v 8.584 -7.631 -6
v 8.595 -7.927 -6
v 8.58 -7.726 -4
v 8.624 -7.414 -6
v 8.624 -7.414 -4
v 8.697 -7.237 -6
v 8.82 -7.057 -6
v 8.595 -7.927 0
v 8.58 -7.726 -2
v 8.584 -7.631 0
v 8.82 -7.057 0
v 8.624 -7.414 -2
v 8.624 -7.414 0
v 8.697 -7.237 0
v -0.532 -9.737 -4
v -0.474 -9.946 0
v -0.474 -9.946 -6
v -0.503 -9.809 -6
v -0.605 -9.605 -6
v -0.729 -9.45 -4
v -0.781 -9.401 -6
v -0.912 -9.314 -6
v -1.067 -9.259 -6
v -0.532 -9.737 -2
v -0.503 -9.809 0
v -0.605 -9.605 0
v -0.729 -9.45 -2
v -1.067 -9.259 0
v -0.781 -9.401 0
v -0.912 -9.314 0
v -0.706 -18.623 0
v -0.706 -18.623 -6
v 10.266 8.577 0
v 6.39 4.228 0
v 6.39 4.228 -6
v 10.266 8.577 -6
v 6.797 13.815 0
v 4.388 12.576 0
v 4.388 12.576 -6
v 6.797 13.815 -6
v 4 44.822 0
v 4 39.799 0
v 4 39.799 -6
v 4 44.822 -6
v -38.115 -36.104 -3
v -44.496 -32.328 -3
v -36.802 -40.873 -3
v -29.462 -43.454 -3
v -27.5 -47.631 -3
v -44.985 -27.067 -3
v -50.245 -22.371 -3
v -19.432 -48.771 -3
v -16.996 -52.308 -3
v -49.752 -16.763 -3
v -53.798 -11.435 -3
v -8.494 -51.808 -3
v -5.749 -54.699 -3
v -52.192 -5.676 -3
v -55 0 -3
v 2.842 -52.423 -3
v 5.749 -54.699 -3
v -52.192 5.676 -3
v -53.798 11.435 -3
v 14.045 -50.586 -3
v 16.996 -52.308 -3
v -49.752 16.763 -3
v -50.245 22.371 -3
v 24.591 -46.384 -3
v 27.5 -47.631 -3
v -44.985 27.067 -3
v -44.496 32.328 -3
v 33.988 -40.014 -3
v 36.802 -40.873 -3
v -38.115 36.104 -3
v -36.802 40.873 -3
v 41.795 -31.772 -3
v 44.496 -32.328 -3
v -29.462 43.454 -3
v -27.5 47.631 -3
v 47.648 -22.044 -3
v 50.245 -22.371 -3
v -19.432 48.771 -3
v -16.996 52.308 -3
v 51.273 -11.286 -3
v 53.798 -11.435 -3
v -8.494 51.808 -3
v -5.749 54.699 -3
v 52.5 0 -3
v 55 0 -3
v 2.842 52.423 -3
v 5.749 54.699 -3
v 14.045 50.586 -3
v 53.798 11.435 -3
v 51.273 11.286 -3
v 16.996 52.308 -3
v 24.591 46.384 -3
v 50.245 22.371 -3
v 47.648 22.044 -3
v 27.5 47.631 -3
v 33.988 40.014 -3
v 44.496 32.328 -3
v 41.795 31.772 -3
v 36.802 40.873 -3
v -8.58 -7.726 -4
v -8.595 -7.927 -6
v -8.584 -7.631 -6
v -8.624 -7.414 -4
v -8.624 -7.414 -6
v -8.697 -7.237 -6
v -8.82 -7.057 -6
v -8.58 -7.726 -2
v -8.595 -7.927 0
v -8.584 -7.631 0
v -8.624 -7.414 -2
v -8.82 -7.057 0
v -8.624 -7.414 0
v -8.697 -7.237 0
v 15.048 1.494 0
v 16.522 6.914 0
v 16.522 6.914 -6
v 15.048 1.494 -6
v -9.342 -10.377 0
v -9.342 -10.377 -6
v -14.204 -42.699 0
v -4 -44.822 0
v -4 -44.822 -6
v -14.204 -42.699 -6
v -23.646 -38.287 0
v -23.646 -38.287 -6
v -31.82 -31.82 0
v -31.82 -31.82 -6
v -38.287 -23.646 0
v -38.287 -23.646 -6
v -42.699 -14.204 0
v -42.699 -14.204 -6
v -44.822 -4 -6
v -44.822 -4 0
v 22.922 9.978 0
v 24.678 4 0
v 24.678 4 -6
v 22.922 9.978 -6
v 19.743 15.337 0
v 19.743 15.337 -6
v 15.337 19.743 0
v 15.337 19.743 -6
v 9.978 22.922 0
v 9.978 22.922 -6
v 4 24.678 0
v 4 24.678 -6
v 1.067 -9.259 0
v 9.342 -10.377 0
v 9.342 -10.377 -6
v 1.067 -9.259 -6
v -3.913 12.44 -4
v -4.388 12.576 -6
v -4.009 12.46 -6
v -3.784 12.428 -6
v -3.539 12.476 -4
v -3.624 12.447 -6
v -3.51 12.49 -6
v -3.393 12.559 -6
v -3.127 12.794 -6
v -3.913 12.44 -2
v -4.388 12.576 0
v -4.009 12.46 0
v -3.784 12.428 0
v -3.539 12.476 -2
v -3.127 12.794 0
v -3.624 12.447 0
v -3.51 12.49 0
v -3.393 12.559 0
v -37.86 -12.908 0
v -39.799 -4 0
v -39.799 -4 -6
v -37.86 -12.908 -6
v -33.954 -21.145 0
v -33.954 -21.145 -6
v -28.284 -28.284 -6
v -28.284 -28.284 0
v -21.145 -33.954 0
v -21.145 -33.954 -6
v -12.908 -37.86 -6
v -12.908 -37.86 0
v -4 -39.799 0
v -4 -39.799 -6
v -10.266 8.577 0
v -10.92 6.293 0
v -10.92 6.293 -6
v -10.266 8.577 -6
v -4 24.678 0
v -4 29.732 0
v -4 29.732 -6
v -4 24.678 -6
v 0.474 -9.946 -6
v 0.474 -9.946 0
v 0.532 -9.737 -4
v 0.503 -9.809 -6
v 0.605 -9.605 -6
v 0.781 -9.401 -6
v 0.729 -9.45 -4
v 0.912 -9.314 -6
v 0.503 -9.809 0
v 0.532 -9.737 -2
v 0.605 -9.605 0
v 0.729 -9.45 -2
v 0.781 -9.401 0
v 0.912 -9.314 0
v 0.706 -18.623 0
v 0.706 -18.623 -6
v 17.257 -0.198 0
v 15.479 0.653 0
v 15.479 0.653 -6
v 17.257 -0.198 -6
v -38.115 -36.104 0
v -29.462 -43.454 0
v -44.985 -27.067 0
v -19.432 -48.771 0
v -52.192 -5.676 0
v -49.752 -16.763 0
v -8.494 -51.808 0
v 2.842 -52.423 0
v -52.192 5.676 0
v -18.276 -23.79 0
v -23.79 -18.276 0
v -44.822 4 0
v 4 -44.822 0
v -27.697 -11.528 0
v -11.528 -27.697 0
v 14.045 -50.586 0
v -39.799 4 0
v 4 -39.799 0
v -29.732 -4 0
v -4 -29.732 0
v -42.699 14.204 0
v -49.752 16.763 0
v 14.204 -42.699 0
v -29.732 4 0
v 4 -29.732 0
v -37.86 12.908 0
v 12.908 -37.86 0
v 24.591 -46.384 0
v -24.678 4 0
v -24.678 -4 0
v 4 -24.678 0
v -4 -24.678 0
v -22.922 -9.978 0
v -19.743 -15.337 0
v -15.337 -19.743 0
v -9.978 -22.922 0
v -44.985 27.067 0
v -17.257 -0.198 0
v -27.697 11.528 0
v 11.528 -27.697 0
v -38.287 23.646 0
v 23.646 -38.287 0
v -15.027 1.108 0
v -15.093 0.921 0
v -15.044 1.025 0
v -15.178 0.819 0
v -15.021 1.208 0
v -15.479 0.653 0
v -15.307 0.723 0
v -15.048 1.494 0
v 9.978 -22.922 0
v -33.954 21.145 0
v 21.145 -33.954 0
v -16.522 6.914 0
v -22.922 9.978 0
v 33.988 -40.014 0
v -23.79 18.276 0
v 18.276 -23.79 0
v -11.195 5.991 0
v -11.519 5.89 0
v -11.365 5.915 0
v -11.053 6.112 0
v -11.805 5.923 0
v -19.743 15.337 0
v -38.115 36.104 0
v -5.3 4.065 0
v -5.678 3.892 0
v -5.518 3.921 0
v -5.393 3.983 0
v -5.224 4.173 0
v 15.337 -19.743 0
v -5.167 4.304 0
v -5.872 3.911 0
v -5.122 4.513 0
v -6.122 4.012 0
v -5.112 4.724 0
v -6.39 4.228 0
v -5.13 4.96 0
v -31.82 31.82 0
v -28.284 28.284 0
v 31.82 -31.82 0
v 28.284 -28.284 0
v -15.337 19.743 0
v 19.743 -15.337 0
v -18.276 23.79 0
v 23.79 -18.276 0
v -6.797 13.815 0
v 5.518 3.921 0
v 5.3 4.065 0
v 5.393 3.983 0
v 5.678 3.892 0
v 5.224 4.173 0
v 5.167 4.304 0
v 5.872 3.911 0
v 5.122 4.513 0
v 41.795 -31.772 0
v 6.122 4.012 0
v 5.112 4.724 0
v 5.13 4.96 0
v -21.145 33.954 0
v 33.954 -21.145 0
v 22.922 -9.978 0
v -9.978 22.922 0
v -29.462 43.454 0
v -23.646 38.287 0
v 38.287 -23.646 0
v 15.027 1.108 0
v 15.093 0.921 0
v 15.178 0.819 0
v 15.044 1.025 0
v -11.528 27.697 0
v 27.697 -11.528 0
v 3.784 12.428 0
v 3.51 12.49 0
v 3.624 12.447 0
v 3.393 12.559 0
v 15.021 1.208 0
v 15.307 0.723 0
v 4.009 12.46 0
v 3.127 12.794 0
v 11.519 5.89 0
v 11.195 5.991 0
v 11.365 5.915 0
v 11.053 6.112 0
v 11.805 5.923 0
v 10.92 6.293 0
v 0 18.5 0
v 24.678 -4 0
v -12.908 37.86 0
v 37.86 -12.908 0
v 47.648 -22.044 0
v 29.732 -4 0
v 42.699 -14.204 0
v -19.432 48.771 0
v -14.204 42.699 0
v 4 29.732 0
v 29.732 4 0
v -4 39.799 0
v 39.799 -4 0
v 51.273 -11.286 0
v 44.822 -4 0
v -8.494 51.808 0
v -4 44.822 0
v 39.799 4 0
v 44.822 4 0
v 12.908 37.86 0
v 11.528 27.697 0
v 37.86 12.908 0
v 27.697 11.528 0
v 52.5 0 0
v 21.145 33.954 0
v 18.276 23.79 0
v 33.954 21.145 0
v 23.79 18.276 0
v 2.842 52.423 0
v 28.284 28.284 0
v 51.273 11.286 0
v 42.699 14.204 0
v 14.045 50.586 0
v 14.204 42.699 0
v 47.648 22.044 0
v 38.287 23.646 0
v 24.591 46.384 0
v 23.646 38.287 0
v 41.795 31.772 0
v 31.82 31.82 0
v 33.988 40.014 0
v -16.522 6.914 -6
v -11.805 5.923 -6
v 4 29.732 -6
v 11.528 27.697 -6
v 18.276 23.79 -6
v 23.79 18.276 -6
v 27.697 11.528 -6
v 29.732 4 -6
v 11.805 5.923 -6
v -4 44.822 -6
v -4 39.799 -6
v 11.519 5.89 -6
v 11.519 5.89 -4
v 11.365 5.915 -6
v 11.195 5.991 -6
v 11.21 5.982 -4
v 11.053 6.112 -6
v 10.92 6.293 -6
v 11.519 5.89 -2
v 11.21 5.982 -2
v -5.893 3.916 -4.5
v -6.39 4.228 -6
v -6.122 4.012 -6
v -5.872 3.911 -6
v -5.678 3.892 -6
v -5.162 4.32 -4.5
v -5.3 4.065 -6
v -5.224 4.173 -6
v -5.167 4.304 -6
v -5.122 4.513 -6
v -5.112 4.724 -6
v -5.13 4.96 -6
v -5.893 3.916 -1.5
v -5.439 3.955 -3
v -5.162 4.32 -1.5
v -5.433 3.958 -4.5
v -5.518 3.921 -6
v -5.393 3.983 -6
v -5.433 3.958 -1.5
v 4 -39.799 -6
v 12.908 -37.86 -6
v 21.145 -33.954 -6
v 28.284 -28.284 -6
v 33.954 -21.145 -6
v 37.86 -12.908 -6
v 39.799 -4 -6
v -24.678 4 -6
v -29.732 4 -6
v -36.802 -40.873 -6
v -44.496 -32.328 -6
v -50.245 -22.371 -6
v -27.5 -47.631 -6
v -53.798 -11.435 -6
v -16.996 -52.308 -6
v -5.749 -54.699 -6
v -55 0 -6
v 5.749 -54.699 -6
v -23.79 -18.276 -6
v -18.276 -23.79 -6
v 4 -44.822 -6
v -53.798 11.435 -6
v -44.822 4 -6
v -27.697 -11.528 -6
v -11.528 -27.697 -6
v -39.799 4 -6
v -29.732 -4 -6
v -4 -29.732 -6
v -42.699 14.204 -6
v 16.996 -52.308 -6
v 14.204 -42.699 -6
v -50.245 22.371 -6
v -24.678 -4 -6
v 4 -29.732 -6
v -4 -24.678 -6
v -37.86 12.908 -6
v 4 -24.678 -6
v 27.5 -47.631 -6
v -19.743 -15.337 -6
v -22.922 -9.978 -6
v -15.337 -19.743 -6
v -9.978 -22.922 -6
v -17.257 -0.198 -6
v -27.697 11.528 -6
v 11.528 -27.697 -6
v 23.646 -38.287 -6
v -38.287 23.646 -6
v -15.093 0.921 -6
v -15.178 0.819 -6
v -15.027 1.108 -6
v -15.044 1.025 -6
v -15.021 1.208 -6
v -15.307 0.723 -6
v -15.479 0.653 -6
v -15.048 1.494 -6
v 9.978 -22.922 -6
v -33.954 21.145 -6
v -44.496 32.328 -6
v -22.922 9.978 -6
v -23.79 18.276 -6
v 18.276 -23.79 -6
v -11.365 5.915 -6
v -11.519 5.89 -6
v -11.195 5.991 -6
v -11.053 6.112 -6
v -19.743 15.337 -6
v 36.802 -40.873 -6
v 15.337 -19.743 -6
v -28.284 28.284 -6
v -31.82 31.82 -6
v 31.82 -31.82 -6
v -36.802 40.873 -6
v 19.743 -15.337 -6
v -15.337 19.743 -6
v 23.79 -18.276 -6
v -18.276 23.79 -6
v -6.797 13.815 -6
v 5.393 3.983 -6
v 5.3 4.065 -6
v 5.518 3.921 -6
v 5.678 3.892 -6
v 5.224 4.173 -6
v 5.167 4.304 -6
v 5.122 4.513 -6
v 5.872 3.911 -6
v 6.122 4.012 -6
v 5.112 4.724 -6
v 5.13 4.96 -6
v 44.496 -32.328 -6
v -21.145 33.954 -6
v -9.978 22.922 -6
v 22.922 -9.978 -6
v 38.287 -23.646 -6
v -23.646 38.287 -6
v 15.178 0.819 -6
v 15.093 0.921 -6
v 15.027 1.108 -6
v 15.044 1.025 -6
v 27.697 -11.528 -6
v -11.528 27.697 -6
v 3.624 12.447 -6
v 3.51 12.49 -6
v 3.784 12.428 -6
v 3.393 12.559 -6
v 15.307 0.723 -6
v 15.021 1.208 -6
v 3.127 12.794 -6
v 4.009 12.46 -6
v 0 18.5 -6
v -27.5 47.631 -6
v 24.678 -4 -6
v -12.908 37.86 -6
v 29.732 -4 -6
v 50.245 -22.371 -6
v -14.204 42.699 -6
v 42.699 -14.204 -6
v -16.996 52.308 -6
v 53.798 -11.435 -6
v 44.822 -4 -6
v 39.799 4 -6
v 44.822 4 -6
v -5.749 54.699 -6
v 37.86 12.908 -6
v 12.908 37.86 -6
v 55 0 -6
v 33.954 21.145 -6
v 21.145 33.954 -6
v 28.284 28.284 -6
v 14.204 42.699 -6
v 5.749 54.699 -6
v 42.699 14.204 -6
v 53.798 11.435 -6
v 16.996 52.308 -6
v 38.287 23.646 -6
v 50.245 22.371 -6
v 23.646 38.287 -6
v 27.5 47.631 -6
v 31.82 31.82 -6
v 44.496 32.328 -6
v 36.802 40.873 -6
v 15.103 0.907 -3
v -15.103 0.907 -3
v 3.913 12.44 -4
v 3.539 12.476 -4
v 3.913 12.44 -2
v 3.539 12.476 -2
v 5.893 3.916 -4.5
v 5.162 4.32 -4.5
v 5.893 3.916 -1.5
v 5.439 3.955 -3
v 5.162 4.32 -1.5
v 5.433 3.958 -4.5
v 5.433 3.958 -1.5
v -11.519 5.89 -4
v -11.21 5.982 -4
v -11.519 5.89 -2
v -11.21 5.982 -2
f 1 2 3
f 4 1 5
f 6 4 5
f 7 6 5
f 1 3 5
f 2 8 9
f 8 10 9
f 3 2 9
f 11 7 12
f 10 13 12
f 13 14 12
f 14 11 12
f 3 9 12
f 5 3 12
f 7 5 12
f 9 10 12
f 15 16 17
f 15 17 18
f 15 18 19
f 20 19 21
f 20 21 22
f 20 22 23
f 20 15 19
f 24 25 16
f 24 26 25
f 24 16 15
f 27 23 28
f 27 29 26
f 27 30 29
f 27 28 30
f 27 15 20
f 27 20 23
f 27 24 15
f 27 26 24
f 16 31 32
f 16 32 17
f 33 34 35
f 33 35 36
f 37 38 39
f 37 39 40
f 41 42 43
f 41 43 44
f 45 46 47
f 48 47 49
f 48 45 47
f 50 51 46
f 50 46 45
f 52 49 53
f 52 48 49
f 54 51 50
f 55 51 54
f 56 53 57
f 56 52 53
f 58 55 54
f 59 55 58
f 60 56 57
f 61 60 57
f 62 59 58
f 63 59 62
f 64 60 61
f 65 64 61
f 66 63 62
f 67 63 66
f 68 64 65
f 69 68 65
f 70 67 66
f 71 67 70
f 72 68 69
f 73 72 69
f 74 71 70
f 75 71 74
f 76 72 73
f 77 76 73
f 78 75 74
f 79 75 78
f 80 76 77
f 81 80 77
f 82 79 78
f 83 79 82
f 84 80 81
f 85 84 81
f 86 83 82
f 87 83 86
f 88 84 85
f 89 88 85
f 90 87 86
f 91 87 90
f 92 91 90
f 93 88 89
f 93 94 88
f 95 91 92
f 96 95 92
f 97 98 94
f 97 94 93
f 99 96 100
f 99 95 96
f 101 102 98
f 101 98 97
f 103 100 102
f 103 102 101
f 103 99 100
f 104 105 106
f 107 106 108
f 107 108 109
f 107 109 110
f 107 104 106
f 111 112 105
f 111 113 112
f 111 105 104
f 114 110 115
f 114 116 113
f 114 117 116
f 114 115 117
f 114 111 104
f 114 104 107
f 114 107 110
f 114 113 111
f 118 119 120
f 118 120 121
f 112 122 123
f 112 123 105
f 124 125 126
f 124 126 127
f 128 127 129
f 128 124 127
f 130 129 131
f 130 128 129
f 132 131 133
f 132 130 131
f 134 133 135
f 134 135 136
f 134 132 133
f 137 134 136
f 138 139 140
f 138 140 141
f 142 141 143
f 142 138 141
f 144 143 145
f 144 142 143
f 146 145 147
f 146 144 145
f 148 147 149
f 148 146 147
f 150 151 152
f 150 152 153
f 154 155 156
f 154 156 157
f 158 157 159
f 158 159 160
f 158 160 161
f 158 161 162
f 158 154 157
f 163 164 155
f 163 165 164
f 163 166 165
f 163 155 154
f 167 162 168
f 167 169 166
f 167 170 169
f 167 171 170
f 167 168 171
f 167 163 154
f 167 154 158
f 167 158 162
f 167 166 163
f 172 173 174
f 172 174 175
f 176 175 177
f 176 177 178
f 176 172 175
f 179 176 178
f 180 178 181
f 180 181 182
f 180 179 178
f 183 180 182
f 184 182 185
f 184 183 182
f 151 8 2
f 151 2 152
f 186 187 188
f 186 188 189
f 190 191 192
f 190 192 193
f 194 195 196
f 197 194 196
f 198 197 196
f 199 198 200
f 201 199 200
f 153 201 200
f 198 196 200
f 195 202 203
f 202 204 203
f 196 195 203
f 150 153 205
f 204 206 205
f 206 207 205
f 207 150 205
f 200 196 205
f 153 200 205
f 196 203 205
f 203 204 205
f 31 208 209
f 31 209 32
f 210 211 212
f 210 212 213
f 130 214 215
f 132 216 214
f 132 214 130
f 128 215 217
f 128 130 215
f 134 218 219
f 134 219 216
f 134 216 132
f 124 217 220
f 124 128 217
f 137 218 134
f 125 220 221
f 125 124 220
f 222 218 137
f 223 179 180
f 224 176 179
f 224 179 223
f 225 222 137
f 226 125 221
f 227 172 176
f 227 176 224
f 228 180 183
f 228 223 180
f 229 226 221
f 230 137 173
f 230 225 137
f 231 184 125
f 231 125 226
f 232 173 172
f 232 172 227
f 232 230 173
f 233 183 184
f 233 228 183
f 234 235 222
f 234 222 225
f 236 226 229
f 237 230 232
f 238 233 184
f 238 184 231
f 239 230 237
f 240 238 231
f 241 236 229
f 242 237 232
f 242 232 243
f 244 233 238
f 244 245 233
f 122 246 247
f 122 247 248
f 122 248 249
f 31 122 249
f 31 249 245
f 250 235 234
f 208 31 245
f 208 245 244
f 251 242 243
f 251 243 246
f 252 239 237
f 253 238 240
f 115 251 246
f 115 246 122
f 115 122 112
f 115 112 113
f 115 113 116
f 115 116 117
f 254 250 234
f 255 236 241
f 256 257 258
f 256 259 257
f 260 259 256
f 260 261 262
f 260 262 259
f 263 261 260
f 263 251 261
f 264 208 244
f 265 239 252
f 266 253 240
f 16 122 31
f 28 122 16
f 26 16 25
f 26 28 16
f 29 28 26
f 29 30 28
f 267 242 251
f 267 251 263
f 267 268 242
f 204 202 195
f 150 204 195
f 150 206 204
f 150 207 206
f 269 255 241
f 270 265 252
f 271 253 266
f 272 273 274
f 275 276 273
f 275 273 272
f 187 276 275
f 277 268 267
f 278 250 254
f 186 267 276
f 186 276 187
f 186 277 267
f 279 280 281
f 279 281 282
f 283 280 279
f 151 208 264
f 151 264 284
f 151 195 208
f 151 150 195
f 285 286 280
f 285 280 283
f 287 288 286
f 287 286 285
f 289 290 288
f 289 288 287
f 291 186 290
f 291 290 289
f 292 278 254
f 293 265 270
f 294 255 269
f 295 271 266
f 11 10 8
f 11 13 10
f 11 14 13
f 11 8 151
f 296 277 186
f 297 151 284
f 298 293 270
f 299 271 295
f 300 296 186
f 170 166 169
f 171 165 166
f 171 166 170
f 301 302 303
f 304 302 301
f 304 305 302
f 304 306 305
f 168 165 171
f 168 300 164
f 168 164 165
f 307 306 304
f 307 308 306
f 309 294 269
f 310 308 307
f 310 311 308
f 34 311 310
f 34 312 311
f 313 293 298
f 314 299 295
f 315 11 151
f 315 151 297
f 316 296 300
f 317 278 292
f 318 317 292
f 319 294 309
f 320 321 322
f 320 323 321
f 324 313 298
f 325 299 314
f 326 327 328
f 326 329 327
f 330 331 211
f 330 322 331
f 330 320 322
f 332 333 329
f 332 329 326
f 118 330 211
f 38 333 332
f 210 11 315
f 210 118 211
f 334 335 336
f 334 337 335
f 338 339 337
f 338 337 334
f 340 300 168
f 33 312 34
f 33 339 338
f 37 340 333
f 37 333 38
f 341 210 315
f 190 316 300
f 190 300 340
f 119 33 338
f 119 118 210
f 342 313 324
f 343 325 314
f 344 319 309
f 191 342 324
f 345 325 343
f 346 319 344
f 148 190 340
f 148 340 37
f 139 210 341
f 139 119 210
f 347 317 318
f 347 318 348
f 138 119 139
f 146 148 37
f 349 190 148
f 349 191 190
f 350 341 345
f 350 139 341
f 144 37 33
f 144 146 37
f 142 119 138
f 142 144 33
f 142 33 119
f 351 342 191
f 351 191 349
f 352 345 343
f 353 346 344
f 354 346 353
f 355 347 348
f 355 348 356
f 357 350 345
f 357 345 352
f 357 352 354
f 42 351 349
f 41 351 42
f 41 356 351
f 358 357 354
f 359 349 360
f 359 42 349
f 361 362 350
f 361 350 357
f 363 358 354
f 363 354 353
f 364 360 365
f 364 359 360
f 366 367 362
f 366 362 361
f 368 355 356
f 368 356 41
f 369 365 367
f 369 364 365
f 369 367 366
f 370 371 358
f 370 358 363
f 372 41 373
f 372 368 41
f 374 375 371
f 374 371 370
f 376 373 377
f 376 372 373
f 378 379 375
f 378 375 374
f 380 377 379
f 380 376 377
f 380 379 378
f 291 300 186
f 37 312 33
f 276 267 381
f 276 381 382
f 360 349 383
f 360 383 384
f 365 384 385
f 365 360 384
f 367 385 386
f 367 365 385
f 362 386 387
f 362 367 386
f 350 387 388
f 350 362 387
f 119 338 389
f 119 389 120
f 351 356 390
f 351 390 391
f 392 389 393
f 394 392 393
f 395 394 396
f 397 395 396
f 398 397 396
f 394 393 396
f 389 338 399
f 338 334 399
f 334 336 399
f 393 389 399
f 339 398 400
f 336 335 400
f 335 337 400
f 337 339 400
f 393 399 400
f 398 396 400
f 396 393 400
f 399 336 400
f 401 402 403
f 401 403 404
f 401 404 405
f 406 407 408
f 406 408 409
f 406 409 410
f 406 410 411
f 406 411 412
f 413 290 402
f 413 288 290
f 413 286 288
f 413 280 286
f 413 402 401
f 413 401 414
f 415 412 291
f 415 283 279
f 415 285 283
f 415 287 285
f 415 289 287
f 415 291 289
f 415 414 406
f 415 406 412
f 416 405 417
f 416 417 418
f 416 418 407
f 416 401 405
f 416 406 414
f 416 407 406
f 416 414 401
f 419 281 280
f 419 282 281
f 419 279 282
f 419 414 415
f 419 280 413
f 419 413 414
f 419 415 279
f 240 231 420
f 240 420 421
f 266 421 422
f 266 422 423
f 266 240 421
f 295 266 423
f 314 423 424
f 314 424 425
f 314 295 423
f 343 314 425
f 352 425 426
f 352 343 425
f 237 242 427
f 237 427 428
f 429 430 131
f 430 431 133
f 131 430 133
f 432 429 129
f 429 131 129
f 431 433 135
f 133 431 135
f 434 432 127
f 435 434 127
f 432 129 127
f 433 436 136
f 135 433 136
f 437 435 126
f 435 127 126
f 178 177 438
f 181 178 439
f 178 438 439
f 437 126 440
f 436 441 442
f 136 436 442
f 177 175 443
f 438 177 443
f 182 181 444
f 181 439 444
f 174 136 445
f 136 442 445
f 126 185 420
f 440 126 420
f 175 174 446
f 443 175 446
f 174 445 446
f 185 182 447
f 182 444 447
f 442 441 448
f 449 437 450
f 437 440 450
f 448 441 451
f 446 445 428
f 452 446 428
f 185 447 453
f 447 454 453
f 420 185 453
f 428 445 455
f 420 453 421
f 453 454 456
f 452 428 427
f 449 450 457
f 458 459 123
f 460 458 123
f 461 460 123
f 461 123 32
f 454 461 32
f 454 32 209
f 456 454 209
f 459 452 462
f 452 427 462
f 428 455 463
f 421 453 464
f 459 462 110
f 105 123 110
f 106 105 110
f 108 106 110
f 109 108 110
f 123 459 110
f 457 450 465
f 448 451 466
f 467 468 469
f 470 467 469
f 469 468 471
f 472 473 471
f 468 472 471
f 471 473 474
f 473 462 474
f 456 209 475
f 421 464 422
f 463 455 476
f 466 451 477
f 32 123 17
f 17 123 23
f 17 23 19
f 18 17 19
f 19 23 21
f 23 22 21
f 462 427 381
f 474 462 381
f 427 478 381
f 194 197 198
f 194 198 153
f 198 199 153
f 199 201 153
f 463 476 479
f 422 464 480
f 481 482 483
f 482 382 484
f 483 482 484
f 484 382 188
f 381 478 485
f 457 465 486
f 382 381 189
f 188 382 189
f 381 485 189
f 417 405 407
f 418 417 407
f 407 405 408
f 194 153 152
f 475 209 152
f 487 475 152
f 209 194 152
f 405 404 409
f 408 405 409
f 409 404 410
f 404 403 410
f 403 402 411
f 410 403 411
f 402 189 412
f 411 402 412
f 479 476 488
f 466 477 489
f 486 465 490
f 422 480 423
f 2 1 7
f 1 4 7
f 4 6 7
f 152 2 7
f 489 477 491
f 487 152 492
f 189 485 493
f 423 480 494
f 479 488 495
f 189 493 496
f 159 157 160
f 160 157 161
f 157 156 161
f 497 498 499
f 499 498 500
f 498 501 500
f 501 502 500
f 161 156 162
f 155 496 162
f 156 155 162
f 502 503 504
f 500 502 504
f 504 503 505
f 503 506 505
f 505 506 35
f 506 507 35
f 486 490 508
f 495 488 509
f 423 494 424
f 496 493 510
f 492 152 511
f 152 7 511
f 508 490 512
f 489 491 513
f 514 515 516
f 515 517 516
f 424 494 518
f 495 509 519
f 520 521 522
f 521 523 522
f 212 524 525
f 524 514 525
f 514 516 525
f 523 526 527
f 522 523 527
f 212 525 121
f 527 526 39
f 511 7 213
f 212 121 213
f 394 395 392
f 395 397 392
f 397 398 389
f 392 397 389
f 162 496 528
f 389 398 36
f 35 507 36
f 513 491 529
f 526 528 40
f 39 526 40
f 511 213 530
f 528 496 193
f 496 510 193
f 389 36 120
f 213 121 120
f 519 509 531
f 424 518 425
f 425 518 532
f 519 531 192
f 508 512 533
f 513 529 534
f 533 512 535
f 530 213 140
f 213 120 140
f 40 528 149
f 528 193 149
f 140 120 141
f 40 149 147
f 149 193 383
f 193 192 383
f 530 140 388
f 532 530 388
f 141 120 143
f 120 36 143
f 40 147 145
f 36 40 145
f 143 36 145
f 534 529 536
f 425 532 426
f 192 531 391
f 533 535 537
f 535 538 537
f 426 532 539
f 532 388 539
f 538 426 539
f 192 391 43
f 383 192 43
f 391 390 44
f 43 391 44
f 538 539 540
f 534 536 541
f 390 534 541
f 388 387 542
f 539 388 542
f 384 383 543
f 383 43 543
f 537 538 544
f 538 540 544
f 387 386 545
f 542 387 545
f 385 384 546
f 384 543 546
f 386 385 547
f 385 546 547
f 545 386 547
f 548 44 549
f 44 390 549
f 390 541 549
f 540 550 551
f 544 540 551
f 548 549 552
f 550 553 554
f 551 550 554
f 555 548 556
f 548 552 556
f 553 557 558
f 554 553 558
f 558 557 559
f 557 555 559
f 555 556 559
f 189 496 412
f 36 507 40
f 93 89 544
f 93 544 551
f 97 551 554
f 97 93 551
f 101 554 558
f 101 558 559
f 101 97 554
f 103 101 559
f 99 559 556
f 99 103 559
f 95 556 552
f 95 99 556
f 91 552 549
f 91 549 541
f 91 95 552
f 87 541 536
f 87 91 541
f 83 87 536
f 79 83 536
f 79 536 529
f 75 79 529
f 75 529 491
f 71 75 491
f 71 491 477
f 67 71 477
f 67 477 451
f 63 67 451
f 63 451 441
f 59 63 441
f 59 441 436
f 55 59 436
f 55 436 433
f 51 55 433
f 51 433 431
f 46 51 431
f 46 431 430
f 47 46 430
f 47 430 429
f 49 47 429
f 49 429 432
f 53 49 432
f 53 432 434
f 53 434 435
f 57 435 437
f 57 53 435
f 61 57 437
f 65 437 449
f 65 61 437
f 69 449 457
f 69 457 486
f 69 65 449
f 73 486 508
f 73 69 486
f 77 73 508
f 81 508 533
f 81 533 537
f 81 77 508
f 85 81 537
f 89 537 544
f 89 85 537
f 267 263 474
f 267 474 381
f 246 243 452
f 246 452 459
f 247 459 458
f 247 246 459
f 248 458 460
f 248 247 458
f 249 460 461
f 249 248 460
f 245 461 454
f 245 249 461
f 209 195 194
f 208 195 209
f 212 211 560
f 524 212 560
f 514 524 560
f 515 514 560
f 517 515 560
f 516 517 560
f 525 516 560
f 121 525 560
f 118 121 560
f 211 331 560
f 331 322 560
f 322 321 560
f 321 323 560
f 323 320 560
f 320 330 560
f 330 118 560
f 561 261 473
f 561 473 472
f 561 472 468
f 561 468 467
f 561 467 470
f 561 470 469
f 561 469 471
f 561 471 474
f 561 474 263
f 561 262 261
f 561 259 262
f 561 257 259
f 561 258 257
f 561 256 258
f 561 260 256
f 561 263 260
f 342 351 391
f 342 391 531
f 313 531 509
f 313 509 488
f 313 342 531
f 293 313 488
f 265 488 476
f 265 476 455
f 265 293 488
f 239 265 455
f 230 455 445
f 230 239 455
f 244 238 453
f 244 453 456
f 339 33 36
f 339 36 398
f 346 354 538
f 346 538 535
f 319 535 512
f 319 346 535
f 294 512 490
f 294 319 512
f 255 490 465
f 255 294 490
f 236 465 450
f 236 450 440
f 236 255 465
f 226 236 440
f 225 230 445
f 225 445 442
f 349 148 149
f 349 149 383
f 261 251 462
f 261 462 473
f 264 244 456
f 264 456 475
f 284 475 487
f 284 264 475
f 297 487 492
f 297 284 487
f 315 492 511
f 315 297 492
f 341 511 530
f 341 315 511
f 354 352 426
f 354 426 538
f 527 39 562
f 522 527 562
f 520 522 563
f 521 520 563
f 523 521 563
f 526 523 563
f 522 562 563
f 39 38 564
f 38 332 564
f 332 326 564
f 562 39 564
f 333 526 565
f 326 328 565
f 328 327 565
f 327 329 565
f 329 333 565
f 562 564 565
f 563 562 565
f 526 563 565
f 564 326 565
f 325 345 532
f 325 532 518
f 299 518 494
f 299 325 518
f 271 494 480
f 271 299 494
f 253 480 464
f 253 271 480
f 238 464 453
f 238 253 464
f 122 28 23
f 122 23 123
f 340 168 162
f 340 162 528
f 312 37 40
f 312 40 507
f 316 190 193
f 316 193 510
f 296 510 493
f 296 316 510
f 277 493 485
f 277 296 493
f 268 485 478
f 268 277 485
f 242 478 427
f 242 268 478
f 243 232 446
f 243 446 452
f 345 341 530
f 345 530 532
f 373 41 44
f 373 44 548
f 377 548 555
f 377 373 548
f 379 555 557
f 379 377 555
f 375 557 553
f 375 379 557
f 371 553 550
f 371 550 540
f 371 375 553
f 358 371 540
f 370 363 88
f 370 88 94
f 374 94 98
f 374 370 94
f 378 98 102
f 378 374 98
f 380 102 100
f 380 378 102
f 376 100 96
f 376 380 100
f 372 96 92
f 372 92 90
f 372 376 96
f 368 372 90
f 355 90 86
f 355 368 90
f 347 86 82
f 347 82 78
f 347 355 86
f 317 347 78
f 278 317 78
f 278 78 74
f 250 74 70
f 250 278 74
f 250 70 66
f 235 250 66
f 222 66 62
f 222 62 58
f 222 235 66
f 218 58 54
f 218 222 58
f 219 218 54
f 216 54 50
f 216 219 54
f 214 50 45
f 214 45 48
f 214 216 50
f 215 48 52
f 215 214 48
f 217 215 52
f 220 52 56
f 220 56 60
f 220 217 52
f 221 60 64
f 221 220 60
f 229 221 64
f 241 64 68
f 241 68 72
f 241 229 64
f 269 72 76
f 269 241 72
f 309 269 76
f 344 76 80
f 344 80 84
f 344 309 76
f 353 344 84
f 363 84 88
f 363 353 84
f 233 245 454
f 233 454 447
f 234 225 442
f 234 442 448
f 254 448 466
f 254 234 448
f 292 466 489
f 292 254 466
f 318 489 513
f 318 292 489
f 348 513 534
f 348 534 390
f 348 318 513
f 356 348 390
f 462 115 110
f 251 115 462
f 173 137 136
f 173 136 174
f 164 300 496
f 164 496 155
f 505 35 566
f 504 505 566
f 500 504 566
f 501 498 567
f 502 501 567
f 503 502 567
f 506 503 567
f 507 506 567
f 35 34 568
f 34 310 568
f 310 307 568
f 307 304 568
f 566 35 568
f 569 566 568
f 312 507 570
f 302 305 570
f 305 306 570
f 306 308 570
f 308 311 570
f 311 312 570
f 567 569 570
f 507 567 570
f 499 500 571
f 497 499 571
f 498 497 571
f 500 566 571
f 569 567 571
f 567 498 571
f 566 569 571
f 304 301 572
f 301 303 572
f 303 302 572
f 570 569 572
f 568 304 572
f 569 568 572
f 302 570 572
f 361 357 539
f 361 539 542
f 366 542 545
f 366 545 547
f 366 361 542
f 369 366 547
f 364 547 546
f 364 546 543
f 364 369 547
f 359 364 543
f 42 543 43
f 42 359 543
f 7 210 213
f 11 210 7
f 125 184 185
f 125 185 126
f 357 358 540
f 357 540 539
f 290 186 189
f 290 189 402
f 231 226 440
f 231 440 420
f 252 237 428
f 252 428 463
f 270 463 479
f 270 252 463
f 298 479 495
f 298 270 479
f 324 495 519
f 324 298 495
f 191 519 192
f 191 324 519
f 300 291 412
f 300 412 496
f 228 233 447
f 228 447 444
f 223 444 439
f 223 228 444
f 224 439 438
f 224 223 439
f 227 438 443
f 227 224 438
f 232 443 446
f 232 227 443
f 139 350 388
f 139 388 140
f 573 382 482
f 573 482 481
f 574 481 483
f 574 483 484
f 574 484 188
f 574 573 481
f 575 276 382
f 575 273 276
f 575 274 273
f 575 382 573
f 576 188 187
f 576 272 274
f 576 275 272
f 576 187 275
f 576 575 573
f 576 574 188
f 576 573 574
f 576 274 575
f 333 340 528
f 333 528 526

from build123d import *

# Parameters (mm, degrees)
F0_R     = 55
F0_R_2   = 52.5
F1_DEPTH = 6
F2_DEPTH = 3


with BuildPart() as f1:
    # F0 (on Top) → F1 (new body)
    with BuildSketch(Plane.XY):
        Circle(F0_R)
        Circle(F0_R_2, mode=Mode.SUBTRACT)
        Circle(F0_R_2)
        with BuildLine():
            Line((-4, -39.7994974843), (-4, -44.821869662))
            ThreePointArc((-4, -44.821869662), (-31.8198051534, -31.8198051534), (-44.821869662, -4))
            Line((-44.821869662, -4), (-39.7994974843, -4))
            ThreePointArc((-39.7994974843, -4), (-28.2842712475, -28.2842712475), (-4, -39.7994974843))
        make_face(mode=Mode.SUBTRACT)
        with BuildLine():
            ThreePointArc((-4, -29.7321374946), (-21.2132034356, -21.2132034356), (-29.7321374946, -4))
            Line((-29.7321374946, -4), (-24.6779253585, -4))
            ThreePointArc((-24.6779253585, -4), (-17.6776695297, -17.6776695297), (-4, -24.6779253585))
            Line((-4, -24.6779253585), (-4, -29.7321374946))
        make_face(mode=Mode.SUBTRACT)
        with BuildLine():
            Line((39.7994974843, -4), (44.821869662, -4))
            ThreePointArc((44.821869662, -4), (31.8198051534, -31.8198051534), (4, -44.821869662))
            Line((4, -44.821869662), (4, -39.7994974843))
            ThreePointArc((4, -39.7994974843), (28.2842712475, -28.2842712475), (39.7994974843, -4))
        make_face(mode=Mode.SUBTRACT)
        with BuildLine():
            ThreePointArc((29.7321374946, -4), (21.2132034356, -21.2132034356), (4, -29.7321374946))
            Line((4, -29.7321374946), (4, -24.6779253585))
            ThreePointArc((4, -24.6779253585), (17.6776695297, -17.6776695297), (24.6779253585, -4))
            Line((24.6779253585, -4), (29.7321374946, -4))
        make_face(mode=Mode.SUBTRACT)
        with BuildLine():
            Line((0.7063379744, -18.6231244003), (0, -18.6231244003))
            Line((0, -18.6231244003), (-0.7063379744, -18.6231244003))
            Line((-0.7063379744, -18.6231244003), (-0.4744689504, -9.9455872551))
            add(Edge.make_bspline(
                [(-0.4744689504, -9.9455872551), (-0.4627407761, -9.8347328603), (-0.6571381819, -9.3434378505), (-1.0671400232, -9.2586101964)],
                knots=[0, 0, 0, 0, 0.9073017578, 0.9073017578, 0.9073017578, 0.9073017578], degree=3))
            Line((-1.0671400232, -9.2586101964), (-9.3420948833, -10.3767029941))
            Line((-9.3420948833, -10.3767029941), (-8.5947467014, -7.927252911))
            add(Edge.make_bspline(
                [(-8.5947467014, -7.927252911), (-8.5831601173, -7.8032519668), (-8.5160043091, -7.4144573882), (-8.8199712336, -7.0574730635)],
                knots=[0, 0, 0, 0, 0.8984670685, 0.8984670685, 0.8984670685, 0.8984670685], degree=3))
            Line((-8.8199712336, -7.0574730635), (-17.2568876296, -0.1983663387))
            Line((-17.2568876296, -0.1983663387), (-15.4789015651, 0.6534472341))
            add(Edge.make_bspline(
                [(-15.4789015651, 0.6534472341), (-15.2981067076, 0.7015652373), (-15.0379305841, 0.9150229577), (-14.9981947616, 1.1539326515), (-15.0481807068, 1.4938330278)],
                knots=[0, 0, 0, 0, 0.4670435173, 1, 1, 1, 1], degree=3))
            Line((-15.0481807068, 1.4938330278), (-16.5220610797, 6.9137872197))
            Line((-16.5220610797, 6.9137872197), (-11.80508174, 5.9227617458))
            add(Edge.make_bspline(
                [(-11.80508174, 5.9227617458), (-11.5451579913, 5.8577810414), (-11.1852632836, 5.842785351), (-10.9203411266, 6.2926532701)],
                knots=[0, 0, 0, 0, 0.9589503078, 0.9589503078, 0.9589503078, 0.9589503078], degree=3))
            Line((-10.9203411266, 6.2926532701), (-10.265532881, 8.576983586))
            Line((-10.265532881, 8.576983586), (-6.390159484, 4.2284368537))
            add(Edge.make_bspline(
                [(-6.390159484, 4.2284368537), (-6.0810563155, 3.8955565542), (-5.2899533571, 3.7433779044), (-5.0645819865, 4.4543202966), (-5.1299692132, 4.9595851451)],
                knots=[0, 0, 0, 0, 0.4924700015, 1, 1, 1, 1], degree=3))
            Line((-5.1299692132, 4.9595851451), (-6.7966869101, 13.8145368546))
            Line((-6.7966869101, 13.8145368546), (-4.387574736, 12.5758592039))
            add(Edge.make_bspline(
                [(-4.387574736, 12.5758592039), (-3.8159328979, 12.3909162357), (-3.60577018, 12.298444286), (-3.1265998259, 12.794428505)],
                knots=[0, 0, 0, 0, 1.2797774272, 1.2797774272, 1.2797774272, 1.2797774272], degree=3))
            Line((-3.1265998259, 12.794428505), (0, 18.499981612))
            Line((0, 18.499981612), (3.1265998259, 12.794428505))
            add(Edge.make_bspline(
                [(4.387574736, 12.5758592039), (3.8159328979, 12.3909162357), (3.60577018, 12.298444286), (3.1265998259, 12.794428505)],
                knots=[0, 0, 0, 0, 1.2797774272, 1.2797774272, 1.2797774272, 1.2797774272], degree=3))
            Line((4.387574736, 12.5758592039), (6.7966869101, 13.8145368546))
            Line((6.7966869101, 13.8145368546), (5.1299692132, 4.9595851451))
            add(Edge.make_bspline(
                [(6.390159484, 4.2284368537), (6.0810563155, 3.8955565542), (5.2899533571, 3.7433779044), (5.0645819865, 4.4543202966), (5.1299692132, 4.9595851451)],
                knots=[0, 0, 0, 0, 0.4924700015, 1, 1, 1, 1], degree=3))
            Line((6.390159484, 4.2284368537), (10.265532881, 8.576983586))
            Line((10.265532881, 8.576983586), (10.9203411266, 6.2926532701))
            add(Edge.make_bspline(
                [(11.80508174, 5.9227617458), (11.5451579913, 5.8577810414), (11.1852632836, 5.842785351), (10.9203411266, 6.2926532701)],
                knots=[0, 0, 0, 0, 0.9589503078, 0.9589503078, 0.9589503078, 0.9589503078], degree=3))
            Line((11.80508174, 5.9227617458), (16.5220610797, 6.9137872197))
            Line((16.5220610797, 6.9137872197), (15.0481807068, 1.4938330278))
            add(Edge.make_bspline(
                [(15.4789015651, 0.6534472341), (15.2981067076, 0.7015652373), (15.0379305841, 0.9150229577), (14.9981947616, 1.1539326515), (15.0481807068, 1.4938330278)],
                knots=[0, 0, 0, 0, 0.4670435173, 1, 1, 1, 1], degree=3))
            Line((15.4789015651, 0.6534472341), (17.2568876296, -0.1983663387))
            Line((17.2568876296, -0.1983663387), (8.8199712336, -7.0574730635))
            add(Edge.make_bspline(
                [(8.5947467014, -7.927252911), (8.5831601173, -7.8032519668), (8.5160043091, -7.4144573882), (8.8199712336, -7.0574730635)],
                knots=[0, 0, 0, 0, 0.8984670685, 0.8984670685, 0.8984670685, 0.8984670685], degree=3))
            Line((8.5947467014, -7.927252911), (9.3420948833, -10.3767029941))
            Line((9.3420948833, -10.3767029941), (1.0671400232, -9.2586101964))
            add(Edge.make_bspline(
                [(0.4744689504, -9.9455872551), (0.4627407761, -9.8347328603), (0.6571381819, -9.3434378505), (1.0671400232, -9.2586101964)],
                knots=[0, 0, 0, 0, 0.9073017578, 0.9073017578, 0.9073017578, 0.9073017578], degree=3))
            Line((0.4744689504, -9.9455872551), (0.7063379744, -18.6231244003))
        make_face(mode=Mode.SUBTRACT)
        with BuildLine():
            Line((-4, 29.7321374946), (-4, 24.6779253585))
            ThreePointArc((-4, 24.6779253585), (-17.6776695297, 17.6776695297), (-24.6779253585, 4))
            Line((-24.6779253585, 4), (-29.7321374946, 4))
            ThreePointArc((-29.7321374946, 4), (-21.2132034356, 21.2132034356), (-4, 29.7321374946))
        make_face(mode=Mode.SUBTRACT)
        with BuildLine():
            Line((-4, 44.821869662), (-4, 39.7994974843))
            ThreePointArc((-4, 39.7994974843), (-28.2842712475, 28.2842712475), (-39.7994974843, 4))
            Line((-39.7994974843, 4), (-44.821869662, 4))
            ThreePointArc((-44.821869662, 4), (-31.8198051534, 31.8198051534), (-4, 44.821869662))
        make_face(mode=Mode.SUBTRACT)
        with BuildLine():
            ThreePointArc((4, 29.7321374946), (21.2132034356, 21.2132034356), (29.7321374946, 4))
            Line((29.7321374946, 4), (24.6779253585, 4))
            ThreePointArc((24.6779253585, 4), (17.6776695297, 17.6776695297), (4, 24.6779253585))
            Line((4, 24.6779253585), (4, 29.7321374946))
        make_face(mode=Mode.SUBTRACT)
        with BuildLine():
            Line((4, 39.7994974843), (4, 44.821869662))
            ThreePointArc((4, 44.821869662), (31.8198051534, 31.8198051534), (44.821869662, 4))
            Line((44.821869662, 4), (39.7994974843, 4))
            ThreePointArc((39.7994974843, 4), (28.2842712475, 28.2842712475), (4, 39.7994974843))
        make_face(mode=Mode.SUBTRACT)
    extrude(amount=-F1_DEPTH)

    # F0 (on Top) → F2 (cut)
    with BuildSketch(Plane.XY):
        Circle(F0_R)
        Circle(F0_R_2, mode=Mode.SUBTRACT)
    extrude(amount=-F2_DEPTH, mode=Mode.SUBTRACT)


solid = f1.part
